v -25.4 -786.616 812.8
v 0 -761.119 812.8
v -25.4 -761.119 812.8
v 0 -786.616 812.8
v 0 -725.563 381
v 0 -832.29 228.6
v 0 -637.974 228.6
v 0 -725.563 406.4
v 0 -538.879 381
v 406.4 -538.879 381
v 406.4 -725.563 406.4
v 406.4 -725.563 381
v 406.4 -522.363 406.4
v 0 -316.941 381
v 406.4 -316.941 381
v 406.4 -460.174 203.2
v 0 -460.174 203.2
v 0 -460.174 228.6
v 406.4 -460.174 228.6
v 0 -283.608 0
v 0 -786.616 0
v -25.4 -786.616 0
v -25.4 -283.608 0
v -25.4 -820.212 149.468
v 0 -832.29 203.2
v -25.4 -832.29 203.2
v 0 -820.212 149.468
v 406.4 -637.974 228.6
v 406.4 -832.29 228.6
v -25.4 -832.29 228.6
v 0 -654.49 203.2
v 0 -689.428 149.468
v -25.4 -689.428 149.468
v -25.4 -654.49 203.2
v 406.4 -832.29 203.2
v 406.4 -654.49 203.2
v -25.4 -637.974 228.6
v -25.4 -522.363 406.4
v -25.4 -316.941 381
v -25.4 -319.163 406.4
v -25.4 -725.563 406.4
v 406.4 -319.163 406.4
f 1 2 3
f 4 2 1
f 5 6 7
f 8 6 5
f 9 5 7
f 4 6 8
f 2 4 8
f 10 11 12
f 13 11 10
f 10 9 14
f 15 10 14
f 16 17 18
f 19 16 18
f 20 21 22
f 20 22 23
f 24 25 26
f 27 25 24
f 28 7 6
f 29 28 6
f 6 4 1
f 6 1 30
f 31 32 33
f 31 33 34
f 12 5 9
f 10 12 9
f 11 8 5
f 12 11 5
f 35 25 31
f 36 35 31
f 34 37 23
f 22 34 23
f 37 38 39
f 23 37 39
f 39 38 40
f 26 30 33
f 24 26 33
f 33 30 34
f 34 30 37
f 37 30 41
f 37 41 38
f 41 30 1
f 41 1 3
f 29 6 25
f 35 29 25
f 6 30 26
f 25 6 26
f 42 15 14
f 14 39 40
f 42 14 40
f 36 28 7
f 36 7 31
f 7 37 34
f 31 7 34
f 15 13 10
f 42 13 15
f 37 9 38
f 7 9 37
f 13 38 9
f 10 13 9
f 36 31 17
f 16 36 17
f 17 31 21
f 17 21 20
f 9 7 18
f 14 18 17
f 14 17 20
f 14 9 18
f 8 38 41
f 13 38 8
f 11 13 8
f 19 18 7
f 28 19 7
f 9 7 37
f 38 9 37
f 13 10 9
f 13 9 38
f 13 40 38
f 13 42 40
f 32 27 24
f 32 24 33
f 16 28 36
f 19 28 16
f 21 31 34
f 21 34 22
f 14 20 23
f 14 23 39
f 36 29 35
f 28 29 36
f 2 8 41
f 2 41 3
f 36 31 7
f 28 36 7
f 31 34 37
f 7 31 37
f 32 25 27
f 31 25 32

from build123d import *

# Parameters (mm, degrees)
F1_DEPTH = 25.4
F2_DEPTH = 25.4
F3_DEPTH = 406.4
F4_DEPTH = 406.4


with BuildPart() as f1:
    # F0 (on Right) → F1 (new body)
    with BuildSketch(Plane.YZ):
        Polygon((-637.9738673686, 228.6), (-538.8792110946, 381), (-725.5634350489, 381), (-748.838246869, 381), (-786.6158517795, 812.8), (-832.2896434142, 228.6), align=None)
        Polygon((-725.5634350489, 381), (-538.8792110946, 381), (-522.3634350489, 406.4), (-725.5634350489, 406.4), align=None)
        Polygon((-820.2121879405, 149.4681142857), (-689.4275879405, 149.4681142857), (-654.4896434142, 203.2), (-832.2896434142, 203.2), align=None)
        Polygon((-654.4896434142, 203.2), (-637.9738673686, 228.6), (-832.2896434142, 228.6), (-832.2896434142, 203.2), align=None)
        Polygon((-748.838246869, 381), (-725.5634350489, 381), (-725.5634350489, 406.4), (-761.1188279059, 812.8), (-786.6158517795, 812.8), align=None)
    extrude(amount=-F1_DEPTH)

    # F0 (on Right) → F3 (join)
    with BuildSketch(Plane.YZ):
        Polygon((-654.4896434142, 203.2), (-637.9738673686, 228.6), (-832.2896434142, 228.6), (-832.2896434142, 203.2), align=None)
        Polygon((-725.5634350489, 381), (-538.8792110946, 381), (-522.3634350489, 406.4), (-725.5634350489, 406.4), align=None)
    extrude(amount=F3_DEPTH)


with BuildPart() as f2:
    # F0 (on Right) → F2 (new body)
    with BuildSketch(Plane.YZ):
        Polygon((-319.1634350489, 0), (-283.608042192, 0), (-316.9412229954, 381), (-538.8792110946, 381), (-637.9738673686, 228.6), (-460.1738673686, 228.6), (-460.1738673686, 203.2), (-654.4896434142, 203.2), (-689.4275879405, 149.4681142857), (-786.6158517795, 0), align=None)
        Polygon((-538.8792110946, 381), (-316.9412229954, 381), (-319.1634350489, 406.4), (-522.3634350489, 406.4), align=None)
        Polygon((-460.1738673686, 228.6), (-637.9738673686, 228.6), (-654.4896434142, 203.2), (-460.1738673686, 203.2), align=None)
    extrude(amount=-F2_DEPTH)

    # F0 (on Right) → F4 (join)
    with BuildSketch(Plane.YZ):
        Polygon((-460.1738673686, 228.6), (-637.9738673686, 228.6), (-654.4896434142, 203.2), (-460.1738673686, 203.2), align=None)
        Polygon((-538.8792110946, 381), (-316.9412229954, 381), (-319.1634350489, 406.4), (-522.3634350489, 406.4), align=None)
    extrude(amount=F4_DEPTH)


solid = Compound([f1.part, f2.part])
